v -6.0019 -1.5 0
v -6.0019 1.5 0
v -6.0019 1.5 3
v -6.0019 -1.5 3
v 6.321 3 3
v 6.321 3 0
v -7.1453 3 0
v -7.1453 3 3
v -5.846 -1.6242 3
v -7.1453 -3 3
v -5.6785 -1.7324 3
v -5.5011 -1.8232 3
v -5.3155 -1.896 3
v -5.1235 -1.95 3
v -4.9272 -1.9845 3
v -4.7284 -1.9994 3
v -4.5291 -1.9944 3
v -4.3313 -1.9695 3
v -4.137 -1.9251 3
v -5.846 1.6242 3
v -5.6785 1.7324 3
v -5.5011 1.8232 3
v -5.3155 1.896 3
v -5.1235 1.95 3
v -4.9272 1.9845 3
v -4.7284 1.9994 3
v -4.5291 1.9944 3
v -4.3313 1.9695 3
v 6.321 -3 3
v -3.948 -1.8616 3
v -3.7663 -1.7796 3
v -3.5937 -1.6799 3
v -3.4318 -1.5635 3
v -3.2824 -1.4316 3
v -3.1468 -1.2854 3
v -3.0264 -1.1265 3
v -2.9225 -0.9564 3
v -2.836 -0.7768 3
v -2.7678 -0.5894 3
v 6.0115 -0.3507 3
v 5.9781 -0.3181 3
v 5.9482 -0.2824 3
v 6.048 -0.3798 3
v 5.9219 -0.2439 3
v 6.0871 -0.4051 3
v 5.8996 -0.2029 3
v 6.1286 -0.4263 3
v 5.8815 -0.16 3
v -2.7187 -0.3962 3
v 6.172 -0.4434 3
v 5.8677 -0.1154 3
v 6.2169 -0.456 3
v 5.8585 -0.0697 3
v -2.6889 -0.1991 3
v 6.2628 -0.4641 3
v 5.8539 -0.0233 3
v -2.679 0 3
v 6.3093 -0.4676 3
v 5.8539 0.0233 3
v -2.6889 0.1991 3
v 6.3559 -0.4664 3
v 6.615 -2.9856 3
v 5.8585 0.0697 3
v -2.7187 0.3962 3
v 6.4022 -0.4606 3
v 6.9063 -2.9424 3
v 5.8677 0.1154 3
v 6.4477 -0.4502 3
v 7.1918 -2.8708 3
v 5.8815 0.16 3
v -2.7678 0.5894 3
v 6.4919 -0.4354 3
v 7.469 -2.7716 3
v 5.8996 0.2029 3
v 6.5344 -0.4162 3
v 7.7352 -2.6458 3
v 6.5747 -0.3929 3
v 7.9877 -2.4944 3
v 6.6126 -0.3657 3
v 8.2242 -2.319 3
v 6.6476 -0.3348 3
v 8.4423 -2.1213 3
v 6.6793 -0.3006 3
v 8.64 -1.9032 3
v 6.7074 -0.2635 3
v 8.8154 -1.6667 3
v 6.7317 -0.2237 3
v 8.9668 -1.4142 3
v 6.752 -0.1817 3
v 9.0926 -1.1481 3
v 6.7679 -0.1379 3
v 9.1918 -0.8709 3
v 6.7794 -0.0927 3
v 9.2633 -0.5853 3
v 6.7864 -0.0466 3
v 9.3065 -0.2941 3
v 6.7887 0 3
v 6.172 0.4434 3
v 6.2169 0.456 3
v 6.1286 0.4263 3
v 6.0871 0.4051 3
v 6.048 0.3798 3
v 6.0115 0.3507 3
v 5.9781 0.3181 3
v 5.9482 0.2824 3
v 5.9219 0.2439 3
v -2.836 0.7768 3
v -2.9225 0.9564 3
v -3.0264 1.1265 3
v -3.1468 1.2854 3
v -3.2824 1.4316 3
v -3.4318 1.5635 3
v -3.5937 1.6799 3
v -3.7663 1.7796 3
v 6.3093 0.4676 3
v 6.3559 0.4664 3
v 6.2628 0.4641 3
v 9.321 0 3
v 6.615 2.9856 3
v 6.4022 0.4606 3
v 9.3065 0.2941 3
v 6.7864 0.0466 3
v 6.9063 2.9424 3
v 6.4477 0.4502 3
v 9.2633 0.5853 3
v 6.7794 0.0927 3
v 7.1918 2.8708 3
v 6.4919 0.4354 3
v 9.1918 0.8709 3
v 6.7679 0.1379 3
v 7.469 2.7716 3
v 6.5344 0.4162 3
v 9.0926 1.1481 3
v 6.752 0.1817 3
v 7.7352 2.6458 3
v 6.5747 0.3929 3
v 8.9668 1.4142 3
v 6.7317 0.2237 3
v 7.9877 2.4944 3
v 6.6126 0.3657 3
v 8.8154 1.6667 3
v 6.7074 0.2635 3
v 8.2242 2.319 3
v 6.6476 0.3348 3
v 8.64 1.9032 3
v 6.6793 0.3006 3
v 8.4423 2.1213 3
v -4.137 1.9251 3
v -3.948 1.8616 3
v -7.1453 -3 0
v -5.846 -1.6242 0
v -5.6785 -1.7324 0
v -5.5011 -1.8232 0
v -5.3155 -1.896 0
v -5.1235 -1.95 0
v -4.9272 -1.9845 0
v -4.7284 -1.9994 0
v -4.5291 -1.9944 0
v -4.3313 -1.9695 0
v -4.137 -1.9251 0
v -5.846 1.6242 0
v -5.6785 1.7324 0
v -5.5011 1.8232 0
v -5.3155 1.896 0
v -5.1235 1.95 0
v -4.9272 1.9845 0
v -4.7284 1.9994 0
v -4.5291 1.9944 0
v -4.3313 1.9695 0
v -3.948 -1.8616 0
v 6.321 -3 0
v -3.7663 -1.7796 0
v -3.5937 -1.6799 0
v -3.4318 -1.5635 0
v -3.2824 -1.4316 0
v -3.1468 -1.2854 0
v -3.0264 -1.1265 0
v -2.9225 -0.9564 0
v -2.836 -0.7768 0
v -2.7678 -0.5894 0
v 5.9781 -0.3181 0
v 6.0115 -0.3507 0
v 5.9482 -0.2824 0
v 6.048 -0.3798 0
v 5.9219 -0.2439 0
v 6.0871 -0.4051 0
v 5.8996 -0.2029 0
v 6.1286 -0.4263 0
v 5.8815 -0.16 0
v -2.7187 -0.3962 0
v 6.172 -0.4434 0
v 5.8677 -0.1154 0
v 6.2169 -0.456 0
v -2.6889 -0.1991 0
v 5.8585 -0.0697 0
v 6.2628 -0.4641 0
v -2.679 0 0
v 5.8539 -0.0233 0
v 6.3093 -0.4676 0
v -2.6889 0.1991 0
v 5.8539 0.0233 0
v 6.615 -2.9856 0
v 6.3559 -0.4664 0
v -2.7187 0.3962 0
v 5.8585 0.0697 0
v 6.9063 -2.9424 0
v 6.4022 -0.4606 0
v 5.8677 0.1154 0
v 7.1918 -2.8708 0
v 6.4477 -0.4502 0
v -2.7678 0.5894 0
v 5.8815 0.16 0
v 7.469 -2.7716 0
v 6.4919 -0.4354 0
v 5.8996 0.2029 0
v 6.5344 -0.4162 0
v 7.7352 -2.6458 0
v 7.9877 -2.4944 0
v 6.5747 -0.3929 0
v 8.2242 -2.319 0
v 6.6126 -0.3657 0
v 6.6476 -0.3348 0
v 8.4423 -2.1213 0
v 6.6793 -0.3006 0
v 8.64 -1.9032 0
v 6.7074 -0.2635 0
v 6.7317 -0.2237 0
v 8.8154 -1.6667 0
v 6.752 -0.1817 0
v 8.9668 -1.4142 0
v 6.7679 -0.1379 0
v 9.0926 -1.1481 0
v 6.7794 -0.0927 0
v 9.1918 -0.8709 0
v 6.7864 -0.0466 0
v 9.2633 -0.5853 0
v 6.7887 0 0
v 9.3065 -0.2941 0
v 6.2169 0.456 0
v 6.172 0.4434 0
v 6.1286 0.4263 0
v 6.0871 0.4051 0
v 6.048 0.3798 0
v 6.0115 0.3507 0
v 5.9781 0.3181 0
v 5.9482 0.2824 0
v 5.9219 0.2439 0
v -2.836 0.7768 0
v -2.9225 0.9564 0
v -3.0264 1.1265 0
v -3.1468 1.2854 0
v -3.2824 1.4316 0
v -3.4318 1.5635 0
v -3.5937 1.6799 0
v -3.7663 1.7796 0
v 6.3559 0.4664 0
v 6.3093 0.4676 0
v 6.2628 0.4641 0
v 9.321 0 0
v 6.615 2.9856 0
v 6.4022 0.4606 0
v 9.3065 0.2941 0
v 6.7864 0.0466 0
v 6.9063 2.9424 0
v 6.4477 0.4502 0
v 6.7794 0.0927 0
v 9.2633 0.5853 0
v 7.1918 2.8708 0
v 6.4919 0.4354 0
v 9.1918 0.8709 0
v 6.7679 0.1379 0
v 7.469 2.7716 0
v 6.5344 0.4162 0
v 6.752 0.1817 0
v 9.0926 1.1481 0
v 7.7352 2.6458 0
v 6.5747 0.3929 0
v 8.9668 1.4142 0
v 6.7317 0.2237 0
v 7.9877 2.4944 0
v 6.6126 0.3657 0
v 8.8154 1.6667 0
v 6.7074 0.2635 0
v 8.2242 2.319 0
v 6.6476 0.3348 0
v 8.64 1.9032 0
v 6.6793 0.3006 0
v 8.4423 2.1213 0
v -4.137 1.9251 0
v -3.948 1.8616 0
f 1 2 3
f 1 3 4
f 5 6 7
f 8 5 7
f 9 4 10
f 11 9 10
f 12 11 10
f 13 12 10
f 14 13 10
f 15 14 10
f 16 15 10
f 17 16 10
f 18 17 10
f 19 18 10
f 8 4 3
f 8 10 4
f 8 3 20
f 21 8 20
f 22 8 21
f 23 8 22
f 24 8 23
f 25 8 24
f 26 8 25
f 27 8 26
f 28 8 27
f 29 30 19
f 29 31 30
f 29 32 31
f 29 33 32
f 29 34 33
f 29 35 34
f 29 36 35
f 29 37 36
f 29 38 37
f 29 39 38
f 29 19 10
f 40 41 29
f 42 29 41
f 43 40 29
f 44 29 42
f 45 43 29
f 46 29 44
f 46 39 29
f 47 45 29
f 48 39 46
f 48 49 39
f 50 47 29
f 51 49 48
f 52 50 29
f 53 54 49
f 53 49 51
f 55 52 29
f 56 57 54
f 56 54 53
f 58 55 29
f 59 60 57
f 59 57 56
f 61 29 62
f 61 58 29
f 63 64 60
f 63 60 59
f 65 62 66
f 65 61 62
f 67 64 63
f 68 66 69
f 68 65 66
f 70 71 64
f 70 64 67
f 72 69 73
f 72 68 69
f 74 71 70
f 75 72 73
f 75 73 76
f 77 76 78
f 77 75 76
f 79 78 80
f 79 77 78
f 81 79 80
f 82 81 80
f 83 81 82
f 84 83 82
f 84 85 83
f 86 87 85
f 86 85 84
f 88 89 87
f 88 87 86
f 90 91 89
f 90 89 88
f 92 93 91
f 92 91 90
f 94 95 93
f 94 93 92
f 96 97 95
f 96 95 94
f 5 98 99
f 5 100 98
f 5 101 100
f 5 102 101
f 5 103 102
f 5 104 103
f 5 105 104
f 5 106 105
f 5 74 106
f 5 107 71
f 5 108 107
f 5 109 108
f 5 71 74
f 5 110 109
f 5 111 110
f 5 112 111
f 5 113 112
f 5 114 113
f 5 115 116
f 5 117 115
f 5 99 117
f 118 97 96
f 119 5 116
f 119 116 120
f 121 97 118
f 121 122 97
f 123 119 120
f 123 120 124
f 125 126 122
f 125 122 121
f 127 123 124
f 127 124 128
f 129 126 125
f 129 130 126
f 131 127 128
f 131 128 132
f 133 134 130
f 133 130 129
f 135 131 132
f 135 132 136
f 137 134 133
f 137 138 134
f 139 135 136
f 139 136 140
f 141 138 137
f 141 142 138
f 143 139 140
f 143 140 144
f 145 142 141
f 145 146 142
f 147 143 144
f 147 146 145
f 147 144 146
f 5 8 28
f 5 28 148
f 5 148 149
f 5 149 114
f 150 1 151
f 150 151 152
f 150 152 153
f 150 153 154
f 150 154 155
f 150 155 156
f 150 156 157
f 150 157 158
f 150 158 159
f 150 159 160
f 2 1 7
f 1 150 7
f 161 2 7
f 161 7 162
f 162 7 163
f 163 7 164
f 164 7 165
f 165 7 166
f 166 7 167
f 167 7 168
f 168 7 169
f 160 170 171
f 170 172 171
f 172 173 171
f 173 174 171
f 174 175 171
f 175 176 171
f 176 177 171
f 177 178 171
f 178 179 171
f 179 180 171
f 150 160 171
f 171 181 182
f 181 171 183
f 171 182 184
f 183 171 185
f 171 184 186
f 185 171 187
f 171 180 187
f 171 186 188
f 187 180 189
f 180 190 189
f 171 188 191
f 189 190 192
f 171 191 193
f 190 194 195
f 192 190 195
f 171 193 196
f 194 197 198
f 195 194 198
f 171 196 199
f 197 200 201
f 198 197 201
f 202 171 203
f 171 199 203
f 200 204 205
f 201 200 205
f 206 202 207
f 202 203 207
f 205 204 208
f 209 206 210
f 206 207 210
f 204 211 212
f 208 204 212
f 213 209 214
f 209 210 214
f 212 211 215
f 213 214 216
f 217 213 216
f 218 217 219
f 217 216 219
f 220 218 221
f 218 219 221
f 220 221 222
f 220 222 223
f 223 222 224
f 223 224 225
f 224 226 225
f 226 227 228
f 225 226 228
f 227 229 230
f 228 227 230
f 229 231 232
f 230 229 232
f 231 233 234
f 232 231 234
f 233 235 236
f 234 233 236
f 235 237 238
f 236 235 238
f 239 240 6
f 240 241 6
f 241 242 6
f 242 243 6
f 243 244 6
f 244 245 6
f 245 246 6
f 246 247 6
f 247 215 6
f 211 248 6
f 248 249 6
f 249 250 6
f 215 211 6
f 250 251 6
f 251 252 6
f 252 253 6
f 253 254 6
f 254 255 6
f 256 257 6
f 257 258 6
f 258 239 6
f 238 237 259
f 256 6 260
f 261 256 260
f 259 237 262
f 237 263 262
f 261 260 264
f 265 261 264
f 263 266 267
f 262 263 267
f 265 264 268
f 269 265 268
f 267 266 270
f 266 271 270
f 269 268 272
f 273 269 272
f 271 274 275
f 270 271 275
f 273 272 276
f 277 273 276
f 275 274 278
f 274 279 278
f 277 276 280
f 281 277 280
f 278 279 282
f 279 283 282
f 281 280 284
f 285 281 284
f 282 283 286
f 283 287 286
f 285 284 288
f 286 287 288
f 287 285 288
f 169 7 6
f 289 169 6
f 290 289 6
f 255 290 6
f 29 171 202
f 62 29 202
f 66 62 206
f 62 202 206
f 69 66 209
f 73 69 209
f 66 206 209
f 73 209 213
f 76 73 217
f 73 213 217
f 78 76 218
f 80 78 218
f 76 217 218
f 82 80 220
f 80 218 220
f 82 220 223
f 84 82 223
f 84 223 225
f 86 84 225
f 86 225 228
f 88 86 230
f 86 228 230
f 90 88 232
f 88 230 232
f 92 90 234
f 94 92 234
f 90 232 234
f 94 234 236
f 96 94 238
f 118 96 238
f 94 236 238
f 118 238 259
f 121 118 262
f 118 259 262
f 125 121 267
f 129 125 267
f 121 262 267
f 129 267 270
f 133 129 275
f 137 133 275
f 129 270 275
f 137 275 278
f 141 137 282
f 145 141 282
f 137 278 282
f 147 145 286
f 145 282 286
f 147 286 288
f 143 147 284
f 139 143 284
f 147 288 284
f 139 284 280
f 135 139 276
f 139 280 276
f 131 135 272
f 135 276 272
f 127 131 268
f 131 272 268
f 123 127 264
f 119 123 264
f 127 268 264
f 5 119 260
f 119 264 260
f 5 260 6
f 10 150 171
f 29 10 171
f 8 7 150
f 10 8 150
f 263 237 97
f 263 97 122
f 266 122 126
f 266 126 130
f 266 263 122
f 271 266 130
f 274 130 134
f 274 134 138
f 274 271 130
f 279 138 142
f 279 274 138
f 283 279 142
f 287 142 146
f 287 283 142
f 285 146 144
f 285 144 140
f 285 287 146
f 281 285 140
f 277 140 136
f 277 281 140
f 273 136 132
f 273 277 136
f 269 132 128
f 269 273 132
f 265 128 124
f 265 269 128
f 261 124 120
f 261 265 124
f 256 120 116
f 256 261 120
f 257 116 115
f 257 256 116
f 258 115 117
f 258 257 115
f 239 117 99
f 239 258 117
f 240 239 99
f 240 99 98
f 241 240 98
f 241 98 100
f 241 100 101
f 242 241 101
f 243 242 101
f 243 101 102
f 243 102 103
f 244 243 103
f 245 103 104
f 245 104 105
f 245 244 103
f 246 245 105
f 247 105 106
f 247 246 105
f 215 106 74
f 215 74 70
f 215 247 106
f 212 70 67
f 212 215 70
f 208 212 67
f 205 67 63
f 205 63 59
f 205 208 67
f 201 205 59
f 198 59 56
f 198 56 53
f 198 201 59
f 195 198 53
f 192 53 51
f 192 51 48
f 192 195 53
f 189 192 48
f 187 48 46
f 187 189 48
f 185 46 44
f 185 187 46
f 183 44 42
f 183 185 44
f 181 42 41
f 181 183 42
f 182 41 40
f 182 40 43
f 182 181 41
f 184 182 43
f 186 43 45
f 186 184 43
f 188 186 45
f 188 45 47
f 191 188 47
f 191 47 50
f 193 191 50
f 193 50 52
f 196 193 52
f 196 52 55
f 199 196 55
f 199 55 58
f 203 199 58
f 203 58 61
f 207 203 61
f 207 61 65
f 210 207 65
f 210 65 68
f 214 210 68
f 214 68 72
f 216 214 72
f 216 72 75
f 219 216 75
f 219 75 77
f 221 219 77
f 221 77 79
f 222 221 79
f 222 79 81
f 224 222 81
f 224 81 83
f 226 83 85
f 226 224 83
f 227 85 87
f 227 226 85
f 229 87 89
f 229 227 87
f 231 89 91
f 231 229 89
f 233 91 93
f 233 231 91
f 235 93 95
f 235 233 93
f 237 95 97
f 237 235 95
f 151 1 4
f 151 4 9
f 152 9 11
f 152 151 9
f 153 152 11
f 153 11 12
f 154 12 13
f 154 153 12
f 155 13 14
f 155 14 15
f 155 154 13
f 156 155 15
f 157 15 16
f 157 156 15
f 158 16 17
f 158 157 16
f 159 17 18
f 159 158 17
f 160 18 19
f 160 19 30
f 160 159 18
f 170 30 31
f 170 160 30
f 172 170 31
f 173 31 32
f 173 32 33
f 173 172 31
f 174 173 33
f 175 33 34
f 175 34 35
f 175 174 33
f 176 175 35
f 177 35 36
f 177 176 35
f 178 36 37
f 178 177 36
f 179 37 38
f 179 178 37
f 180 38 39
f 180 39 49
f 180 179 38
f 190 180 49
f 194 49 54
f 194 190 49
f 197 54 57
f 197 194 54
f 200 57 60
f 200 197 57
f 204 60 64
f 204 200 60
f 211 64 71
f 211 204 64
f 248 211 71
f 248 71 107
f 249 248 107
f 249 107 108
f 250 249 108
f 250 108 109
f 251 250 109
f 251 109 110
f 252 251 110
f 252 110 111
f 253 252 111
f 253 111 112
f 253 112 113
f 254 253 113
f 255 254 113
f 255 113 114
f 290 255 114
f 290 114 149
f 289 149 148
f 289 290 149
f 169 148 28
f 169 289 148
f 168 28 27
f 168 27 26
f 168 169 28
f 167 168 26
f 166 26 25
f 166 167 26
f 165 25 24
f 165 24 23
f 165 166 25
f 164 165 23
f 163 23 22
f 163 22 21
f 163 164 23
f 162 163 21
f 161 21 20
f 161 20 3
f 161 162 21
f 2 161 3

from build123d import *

# Parameters (mm, degrees)
SKETCH1_R           = 0.467713673
BOSS_EXTRUDE1_DEPTH = 3


with BuildPart() as part:
    # Sketch1 → Boss-Extrude1 (new body)
    with BuildSketch(Plane.XY):
        with BuildLine():
            Line((-7.145342709, -3), (6.320992929, -3))
            ThreePointArc((6.320992929, -3), (9.320992929, 0), (6.320992929, 3))
            Line((6.320992929, 3), (-7.145342709, 3))
            Line((-7.145342709, 3), (-7.145342709, -3))
        make_face()
        with Locations((6.320992929, 0)):
            Circle(SKETCH1_R, mode=Mode.SUBTRACT)
        with BuildLine():
            Line((-6.001882726, 1.5), (-6.001882726, -1.5))
            ThreePointArc((-6.001882726, -1.5), (-2.679007071, 0), (-6.001882726, 1.5))
        make_face(mode=Mode.SUBTRACT)
    extrude(amount=BOSS_EXTRUDE1_DEPTH)


solid = part.part
